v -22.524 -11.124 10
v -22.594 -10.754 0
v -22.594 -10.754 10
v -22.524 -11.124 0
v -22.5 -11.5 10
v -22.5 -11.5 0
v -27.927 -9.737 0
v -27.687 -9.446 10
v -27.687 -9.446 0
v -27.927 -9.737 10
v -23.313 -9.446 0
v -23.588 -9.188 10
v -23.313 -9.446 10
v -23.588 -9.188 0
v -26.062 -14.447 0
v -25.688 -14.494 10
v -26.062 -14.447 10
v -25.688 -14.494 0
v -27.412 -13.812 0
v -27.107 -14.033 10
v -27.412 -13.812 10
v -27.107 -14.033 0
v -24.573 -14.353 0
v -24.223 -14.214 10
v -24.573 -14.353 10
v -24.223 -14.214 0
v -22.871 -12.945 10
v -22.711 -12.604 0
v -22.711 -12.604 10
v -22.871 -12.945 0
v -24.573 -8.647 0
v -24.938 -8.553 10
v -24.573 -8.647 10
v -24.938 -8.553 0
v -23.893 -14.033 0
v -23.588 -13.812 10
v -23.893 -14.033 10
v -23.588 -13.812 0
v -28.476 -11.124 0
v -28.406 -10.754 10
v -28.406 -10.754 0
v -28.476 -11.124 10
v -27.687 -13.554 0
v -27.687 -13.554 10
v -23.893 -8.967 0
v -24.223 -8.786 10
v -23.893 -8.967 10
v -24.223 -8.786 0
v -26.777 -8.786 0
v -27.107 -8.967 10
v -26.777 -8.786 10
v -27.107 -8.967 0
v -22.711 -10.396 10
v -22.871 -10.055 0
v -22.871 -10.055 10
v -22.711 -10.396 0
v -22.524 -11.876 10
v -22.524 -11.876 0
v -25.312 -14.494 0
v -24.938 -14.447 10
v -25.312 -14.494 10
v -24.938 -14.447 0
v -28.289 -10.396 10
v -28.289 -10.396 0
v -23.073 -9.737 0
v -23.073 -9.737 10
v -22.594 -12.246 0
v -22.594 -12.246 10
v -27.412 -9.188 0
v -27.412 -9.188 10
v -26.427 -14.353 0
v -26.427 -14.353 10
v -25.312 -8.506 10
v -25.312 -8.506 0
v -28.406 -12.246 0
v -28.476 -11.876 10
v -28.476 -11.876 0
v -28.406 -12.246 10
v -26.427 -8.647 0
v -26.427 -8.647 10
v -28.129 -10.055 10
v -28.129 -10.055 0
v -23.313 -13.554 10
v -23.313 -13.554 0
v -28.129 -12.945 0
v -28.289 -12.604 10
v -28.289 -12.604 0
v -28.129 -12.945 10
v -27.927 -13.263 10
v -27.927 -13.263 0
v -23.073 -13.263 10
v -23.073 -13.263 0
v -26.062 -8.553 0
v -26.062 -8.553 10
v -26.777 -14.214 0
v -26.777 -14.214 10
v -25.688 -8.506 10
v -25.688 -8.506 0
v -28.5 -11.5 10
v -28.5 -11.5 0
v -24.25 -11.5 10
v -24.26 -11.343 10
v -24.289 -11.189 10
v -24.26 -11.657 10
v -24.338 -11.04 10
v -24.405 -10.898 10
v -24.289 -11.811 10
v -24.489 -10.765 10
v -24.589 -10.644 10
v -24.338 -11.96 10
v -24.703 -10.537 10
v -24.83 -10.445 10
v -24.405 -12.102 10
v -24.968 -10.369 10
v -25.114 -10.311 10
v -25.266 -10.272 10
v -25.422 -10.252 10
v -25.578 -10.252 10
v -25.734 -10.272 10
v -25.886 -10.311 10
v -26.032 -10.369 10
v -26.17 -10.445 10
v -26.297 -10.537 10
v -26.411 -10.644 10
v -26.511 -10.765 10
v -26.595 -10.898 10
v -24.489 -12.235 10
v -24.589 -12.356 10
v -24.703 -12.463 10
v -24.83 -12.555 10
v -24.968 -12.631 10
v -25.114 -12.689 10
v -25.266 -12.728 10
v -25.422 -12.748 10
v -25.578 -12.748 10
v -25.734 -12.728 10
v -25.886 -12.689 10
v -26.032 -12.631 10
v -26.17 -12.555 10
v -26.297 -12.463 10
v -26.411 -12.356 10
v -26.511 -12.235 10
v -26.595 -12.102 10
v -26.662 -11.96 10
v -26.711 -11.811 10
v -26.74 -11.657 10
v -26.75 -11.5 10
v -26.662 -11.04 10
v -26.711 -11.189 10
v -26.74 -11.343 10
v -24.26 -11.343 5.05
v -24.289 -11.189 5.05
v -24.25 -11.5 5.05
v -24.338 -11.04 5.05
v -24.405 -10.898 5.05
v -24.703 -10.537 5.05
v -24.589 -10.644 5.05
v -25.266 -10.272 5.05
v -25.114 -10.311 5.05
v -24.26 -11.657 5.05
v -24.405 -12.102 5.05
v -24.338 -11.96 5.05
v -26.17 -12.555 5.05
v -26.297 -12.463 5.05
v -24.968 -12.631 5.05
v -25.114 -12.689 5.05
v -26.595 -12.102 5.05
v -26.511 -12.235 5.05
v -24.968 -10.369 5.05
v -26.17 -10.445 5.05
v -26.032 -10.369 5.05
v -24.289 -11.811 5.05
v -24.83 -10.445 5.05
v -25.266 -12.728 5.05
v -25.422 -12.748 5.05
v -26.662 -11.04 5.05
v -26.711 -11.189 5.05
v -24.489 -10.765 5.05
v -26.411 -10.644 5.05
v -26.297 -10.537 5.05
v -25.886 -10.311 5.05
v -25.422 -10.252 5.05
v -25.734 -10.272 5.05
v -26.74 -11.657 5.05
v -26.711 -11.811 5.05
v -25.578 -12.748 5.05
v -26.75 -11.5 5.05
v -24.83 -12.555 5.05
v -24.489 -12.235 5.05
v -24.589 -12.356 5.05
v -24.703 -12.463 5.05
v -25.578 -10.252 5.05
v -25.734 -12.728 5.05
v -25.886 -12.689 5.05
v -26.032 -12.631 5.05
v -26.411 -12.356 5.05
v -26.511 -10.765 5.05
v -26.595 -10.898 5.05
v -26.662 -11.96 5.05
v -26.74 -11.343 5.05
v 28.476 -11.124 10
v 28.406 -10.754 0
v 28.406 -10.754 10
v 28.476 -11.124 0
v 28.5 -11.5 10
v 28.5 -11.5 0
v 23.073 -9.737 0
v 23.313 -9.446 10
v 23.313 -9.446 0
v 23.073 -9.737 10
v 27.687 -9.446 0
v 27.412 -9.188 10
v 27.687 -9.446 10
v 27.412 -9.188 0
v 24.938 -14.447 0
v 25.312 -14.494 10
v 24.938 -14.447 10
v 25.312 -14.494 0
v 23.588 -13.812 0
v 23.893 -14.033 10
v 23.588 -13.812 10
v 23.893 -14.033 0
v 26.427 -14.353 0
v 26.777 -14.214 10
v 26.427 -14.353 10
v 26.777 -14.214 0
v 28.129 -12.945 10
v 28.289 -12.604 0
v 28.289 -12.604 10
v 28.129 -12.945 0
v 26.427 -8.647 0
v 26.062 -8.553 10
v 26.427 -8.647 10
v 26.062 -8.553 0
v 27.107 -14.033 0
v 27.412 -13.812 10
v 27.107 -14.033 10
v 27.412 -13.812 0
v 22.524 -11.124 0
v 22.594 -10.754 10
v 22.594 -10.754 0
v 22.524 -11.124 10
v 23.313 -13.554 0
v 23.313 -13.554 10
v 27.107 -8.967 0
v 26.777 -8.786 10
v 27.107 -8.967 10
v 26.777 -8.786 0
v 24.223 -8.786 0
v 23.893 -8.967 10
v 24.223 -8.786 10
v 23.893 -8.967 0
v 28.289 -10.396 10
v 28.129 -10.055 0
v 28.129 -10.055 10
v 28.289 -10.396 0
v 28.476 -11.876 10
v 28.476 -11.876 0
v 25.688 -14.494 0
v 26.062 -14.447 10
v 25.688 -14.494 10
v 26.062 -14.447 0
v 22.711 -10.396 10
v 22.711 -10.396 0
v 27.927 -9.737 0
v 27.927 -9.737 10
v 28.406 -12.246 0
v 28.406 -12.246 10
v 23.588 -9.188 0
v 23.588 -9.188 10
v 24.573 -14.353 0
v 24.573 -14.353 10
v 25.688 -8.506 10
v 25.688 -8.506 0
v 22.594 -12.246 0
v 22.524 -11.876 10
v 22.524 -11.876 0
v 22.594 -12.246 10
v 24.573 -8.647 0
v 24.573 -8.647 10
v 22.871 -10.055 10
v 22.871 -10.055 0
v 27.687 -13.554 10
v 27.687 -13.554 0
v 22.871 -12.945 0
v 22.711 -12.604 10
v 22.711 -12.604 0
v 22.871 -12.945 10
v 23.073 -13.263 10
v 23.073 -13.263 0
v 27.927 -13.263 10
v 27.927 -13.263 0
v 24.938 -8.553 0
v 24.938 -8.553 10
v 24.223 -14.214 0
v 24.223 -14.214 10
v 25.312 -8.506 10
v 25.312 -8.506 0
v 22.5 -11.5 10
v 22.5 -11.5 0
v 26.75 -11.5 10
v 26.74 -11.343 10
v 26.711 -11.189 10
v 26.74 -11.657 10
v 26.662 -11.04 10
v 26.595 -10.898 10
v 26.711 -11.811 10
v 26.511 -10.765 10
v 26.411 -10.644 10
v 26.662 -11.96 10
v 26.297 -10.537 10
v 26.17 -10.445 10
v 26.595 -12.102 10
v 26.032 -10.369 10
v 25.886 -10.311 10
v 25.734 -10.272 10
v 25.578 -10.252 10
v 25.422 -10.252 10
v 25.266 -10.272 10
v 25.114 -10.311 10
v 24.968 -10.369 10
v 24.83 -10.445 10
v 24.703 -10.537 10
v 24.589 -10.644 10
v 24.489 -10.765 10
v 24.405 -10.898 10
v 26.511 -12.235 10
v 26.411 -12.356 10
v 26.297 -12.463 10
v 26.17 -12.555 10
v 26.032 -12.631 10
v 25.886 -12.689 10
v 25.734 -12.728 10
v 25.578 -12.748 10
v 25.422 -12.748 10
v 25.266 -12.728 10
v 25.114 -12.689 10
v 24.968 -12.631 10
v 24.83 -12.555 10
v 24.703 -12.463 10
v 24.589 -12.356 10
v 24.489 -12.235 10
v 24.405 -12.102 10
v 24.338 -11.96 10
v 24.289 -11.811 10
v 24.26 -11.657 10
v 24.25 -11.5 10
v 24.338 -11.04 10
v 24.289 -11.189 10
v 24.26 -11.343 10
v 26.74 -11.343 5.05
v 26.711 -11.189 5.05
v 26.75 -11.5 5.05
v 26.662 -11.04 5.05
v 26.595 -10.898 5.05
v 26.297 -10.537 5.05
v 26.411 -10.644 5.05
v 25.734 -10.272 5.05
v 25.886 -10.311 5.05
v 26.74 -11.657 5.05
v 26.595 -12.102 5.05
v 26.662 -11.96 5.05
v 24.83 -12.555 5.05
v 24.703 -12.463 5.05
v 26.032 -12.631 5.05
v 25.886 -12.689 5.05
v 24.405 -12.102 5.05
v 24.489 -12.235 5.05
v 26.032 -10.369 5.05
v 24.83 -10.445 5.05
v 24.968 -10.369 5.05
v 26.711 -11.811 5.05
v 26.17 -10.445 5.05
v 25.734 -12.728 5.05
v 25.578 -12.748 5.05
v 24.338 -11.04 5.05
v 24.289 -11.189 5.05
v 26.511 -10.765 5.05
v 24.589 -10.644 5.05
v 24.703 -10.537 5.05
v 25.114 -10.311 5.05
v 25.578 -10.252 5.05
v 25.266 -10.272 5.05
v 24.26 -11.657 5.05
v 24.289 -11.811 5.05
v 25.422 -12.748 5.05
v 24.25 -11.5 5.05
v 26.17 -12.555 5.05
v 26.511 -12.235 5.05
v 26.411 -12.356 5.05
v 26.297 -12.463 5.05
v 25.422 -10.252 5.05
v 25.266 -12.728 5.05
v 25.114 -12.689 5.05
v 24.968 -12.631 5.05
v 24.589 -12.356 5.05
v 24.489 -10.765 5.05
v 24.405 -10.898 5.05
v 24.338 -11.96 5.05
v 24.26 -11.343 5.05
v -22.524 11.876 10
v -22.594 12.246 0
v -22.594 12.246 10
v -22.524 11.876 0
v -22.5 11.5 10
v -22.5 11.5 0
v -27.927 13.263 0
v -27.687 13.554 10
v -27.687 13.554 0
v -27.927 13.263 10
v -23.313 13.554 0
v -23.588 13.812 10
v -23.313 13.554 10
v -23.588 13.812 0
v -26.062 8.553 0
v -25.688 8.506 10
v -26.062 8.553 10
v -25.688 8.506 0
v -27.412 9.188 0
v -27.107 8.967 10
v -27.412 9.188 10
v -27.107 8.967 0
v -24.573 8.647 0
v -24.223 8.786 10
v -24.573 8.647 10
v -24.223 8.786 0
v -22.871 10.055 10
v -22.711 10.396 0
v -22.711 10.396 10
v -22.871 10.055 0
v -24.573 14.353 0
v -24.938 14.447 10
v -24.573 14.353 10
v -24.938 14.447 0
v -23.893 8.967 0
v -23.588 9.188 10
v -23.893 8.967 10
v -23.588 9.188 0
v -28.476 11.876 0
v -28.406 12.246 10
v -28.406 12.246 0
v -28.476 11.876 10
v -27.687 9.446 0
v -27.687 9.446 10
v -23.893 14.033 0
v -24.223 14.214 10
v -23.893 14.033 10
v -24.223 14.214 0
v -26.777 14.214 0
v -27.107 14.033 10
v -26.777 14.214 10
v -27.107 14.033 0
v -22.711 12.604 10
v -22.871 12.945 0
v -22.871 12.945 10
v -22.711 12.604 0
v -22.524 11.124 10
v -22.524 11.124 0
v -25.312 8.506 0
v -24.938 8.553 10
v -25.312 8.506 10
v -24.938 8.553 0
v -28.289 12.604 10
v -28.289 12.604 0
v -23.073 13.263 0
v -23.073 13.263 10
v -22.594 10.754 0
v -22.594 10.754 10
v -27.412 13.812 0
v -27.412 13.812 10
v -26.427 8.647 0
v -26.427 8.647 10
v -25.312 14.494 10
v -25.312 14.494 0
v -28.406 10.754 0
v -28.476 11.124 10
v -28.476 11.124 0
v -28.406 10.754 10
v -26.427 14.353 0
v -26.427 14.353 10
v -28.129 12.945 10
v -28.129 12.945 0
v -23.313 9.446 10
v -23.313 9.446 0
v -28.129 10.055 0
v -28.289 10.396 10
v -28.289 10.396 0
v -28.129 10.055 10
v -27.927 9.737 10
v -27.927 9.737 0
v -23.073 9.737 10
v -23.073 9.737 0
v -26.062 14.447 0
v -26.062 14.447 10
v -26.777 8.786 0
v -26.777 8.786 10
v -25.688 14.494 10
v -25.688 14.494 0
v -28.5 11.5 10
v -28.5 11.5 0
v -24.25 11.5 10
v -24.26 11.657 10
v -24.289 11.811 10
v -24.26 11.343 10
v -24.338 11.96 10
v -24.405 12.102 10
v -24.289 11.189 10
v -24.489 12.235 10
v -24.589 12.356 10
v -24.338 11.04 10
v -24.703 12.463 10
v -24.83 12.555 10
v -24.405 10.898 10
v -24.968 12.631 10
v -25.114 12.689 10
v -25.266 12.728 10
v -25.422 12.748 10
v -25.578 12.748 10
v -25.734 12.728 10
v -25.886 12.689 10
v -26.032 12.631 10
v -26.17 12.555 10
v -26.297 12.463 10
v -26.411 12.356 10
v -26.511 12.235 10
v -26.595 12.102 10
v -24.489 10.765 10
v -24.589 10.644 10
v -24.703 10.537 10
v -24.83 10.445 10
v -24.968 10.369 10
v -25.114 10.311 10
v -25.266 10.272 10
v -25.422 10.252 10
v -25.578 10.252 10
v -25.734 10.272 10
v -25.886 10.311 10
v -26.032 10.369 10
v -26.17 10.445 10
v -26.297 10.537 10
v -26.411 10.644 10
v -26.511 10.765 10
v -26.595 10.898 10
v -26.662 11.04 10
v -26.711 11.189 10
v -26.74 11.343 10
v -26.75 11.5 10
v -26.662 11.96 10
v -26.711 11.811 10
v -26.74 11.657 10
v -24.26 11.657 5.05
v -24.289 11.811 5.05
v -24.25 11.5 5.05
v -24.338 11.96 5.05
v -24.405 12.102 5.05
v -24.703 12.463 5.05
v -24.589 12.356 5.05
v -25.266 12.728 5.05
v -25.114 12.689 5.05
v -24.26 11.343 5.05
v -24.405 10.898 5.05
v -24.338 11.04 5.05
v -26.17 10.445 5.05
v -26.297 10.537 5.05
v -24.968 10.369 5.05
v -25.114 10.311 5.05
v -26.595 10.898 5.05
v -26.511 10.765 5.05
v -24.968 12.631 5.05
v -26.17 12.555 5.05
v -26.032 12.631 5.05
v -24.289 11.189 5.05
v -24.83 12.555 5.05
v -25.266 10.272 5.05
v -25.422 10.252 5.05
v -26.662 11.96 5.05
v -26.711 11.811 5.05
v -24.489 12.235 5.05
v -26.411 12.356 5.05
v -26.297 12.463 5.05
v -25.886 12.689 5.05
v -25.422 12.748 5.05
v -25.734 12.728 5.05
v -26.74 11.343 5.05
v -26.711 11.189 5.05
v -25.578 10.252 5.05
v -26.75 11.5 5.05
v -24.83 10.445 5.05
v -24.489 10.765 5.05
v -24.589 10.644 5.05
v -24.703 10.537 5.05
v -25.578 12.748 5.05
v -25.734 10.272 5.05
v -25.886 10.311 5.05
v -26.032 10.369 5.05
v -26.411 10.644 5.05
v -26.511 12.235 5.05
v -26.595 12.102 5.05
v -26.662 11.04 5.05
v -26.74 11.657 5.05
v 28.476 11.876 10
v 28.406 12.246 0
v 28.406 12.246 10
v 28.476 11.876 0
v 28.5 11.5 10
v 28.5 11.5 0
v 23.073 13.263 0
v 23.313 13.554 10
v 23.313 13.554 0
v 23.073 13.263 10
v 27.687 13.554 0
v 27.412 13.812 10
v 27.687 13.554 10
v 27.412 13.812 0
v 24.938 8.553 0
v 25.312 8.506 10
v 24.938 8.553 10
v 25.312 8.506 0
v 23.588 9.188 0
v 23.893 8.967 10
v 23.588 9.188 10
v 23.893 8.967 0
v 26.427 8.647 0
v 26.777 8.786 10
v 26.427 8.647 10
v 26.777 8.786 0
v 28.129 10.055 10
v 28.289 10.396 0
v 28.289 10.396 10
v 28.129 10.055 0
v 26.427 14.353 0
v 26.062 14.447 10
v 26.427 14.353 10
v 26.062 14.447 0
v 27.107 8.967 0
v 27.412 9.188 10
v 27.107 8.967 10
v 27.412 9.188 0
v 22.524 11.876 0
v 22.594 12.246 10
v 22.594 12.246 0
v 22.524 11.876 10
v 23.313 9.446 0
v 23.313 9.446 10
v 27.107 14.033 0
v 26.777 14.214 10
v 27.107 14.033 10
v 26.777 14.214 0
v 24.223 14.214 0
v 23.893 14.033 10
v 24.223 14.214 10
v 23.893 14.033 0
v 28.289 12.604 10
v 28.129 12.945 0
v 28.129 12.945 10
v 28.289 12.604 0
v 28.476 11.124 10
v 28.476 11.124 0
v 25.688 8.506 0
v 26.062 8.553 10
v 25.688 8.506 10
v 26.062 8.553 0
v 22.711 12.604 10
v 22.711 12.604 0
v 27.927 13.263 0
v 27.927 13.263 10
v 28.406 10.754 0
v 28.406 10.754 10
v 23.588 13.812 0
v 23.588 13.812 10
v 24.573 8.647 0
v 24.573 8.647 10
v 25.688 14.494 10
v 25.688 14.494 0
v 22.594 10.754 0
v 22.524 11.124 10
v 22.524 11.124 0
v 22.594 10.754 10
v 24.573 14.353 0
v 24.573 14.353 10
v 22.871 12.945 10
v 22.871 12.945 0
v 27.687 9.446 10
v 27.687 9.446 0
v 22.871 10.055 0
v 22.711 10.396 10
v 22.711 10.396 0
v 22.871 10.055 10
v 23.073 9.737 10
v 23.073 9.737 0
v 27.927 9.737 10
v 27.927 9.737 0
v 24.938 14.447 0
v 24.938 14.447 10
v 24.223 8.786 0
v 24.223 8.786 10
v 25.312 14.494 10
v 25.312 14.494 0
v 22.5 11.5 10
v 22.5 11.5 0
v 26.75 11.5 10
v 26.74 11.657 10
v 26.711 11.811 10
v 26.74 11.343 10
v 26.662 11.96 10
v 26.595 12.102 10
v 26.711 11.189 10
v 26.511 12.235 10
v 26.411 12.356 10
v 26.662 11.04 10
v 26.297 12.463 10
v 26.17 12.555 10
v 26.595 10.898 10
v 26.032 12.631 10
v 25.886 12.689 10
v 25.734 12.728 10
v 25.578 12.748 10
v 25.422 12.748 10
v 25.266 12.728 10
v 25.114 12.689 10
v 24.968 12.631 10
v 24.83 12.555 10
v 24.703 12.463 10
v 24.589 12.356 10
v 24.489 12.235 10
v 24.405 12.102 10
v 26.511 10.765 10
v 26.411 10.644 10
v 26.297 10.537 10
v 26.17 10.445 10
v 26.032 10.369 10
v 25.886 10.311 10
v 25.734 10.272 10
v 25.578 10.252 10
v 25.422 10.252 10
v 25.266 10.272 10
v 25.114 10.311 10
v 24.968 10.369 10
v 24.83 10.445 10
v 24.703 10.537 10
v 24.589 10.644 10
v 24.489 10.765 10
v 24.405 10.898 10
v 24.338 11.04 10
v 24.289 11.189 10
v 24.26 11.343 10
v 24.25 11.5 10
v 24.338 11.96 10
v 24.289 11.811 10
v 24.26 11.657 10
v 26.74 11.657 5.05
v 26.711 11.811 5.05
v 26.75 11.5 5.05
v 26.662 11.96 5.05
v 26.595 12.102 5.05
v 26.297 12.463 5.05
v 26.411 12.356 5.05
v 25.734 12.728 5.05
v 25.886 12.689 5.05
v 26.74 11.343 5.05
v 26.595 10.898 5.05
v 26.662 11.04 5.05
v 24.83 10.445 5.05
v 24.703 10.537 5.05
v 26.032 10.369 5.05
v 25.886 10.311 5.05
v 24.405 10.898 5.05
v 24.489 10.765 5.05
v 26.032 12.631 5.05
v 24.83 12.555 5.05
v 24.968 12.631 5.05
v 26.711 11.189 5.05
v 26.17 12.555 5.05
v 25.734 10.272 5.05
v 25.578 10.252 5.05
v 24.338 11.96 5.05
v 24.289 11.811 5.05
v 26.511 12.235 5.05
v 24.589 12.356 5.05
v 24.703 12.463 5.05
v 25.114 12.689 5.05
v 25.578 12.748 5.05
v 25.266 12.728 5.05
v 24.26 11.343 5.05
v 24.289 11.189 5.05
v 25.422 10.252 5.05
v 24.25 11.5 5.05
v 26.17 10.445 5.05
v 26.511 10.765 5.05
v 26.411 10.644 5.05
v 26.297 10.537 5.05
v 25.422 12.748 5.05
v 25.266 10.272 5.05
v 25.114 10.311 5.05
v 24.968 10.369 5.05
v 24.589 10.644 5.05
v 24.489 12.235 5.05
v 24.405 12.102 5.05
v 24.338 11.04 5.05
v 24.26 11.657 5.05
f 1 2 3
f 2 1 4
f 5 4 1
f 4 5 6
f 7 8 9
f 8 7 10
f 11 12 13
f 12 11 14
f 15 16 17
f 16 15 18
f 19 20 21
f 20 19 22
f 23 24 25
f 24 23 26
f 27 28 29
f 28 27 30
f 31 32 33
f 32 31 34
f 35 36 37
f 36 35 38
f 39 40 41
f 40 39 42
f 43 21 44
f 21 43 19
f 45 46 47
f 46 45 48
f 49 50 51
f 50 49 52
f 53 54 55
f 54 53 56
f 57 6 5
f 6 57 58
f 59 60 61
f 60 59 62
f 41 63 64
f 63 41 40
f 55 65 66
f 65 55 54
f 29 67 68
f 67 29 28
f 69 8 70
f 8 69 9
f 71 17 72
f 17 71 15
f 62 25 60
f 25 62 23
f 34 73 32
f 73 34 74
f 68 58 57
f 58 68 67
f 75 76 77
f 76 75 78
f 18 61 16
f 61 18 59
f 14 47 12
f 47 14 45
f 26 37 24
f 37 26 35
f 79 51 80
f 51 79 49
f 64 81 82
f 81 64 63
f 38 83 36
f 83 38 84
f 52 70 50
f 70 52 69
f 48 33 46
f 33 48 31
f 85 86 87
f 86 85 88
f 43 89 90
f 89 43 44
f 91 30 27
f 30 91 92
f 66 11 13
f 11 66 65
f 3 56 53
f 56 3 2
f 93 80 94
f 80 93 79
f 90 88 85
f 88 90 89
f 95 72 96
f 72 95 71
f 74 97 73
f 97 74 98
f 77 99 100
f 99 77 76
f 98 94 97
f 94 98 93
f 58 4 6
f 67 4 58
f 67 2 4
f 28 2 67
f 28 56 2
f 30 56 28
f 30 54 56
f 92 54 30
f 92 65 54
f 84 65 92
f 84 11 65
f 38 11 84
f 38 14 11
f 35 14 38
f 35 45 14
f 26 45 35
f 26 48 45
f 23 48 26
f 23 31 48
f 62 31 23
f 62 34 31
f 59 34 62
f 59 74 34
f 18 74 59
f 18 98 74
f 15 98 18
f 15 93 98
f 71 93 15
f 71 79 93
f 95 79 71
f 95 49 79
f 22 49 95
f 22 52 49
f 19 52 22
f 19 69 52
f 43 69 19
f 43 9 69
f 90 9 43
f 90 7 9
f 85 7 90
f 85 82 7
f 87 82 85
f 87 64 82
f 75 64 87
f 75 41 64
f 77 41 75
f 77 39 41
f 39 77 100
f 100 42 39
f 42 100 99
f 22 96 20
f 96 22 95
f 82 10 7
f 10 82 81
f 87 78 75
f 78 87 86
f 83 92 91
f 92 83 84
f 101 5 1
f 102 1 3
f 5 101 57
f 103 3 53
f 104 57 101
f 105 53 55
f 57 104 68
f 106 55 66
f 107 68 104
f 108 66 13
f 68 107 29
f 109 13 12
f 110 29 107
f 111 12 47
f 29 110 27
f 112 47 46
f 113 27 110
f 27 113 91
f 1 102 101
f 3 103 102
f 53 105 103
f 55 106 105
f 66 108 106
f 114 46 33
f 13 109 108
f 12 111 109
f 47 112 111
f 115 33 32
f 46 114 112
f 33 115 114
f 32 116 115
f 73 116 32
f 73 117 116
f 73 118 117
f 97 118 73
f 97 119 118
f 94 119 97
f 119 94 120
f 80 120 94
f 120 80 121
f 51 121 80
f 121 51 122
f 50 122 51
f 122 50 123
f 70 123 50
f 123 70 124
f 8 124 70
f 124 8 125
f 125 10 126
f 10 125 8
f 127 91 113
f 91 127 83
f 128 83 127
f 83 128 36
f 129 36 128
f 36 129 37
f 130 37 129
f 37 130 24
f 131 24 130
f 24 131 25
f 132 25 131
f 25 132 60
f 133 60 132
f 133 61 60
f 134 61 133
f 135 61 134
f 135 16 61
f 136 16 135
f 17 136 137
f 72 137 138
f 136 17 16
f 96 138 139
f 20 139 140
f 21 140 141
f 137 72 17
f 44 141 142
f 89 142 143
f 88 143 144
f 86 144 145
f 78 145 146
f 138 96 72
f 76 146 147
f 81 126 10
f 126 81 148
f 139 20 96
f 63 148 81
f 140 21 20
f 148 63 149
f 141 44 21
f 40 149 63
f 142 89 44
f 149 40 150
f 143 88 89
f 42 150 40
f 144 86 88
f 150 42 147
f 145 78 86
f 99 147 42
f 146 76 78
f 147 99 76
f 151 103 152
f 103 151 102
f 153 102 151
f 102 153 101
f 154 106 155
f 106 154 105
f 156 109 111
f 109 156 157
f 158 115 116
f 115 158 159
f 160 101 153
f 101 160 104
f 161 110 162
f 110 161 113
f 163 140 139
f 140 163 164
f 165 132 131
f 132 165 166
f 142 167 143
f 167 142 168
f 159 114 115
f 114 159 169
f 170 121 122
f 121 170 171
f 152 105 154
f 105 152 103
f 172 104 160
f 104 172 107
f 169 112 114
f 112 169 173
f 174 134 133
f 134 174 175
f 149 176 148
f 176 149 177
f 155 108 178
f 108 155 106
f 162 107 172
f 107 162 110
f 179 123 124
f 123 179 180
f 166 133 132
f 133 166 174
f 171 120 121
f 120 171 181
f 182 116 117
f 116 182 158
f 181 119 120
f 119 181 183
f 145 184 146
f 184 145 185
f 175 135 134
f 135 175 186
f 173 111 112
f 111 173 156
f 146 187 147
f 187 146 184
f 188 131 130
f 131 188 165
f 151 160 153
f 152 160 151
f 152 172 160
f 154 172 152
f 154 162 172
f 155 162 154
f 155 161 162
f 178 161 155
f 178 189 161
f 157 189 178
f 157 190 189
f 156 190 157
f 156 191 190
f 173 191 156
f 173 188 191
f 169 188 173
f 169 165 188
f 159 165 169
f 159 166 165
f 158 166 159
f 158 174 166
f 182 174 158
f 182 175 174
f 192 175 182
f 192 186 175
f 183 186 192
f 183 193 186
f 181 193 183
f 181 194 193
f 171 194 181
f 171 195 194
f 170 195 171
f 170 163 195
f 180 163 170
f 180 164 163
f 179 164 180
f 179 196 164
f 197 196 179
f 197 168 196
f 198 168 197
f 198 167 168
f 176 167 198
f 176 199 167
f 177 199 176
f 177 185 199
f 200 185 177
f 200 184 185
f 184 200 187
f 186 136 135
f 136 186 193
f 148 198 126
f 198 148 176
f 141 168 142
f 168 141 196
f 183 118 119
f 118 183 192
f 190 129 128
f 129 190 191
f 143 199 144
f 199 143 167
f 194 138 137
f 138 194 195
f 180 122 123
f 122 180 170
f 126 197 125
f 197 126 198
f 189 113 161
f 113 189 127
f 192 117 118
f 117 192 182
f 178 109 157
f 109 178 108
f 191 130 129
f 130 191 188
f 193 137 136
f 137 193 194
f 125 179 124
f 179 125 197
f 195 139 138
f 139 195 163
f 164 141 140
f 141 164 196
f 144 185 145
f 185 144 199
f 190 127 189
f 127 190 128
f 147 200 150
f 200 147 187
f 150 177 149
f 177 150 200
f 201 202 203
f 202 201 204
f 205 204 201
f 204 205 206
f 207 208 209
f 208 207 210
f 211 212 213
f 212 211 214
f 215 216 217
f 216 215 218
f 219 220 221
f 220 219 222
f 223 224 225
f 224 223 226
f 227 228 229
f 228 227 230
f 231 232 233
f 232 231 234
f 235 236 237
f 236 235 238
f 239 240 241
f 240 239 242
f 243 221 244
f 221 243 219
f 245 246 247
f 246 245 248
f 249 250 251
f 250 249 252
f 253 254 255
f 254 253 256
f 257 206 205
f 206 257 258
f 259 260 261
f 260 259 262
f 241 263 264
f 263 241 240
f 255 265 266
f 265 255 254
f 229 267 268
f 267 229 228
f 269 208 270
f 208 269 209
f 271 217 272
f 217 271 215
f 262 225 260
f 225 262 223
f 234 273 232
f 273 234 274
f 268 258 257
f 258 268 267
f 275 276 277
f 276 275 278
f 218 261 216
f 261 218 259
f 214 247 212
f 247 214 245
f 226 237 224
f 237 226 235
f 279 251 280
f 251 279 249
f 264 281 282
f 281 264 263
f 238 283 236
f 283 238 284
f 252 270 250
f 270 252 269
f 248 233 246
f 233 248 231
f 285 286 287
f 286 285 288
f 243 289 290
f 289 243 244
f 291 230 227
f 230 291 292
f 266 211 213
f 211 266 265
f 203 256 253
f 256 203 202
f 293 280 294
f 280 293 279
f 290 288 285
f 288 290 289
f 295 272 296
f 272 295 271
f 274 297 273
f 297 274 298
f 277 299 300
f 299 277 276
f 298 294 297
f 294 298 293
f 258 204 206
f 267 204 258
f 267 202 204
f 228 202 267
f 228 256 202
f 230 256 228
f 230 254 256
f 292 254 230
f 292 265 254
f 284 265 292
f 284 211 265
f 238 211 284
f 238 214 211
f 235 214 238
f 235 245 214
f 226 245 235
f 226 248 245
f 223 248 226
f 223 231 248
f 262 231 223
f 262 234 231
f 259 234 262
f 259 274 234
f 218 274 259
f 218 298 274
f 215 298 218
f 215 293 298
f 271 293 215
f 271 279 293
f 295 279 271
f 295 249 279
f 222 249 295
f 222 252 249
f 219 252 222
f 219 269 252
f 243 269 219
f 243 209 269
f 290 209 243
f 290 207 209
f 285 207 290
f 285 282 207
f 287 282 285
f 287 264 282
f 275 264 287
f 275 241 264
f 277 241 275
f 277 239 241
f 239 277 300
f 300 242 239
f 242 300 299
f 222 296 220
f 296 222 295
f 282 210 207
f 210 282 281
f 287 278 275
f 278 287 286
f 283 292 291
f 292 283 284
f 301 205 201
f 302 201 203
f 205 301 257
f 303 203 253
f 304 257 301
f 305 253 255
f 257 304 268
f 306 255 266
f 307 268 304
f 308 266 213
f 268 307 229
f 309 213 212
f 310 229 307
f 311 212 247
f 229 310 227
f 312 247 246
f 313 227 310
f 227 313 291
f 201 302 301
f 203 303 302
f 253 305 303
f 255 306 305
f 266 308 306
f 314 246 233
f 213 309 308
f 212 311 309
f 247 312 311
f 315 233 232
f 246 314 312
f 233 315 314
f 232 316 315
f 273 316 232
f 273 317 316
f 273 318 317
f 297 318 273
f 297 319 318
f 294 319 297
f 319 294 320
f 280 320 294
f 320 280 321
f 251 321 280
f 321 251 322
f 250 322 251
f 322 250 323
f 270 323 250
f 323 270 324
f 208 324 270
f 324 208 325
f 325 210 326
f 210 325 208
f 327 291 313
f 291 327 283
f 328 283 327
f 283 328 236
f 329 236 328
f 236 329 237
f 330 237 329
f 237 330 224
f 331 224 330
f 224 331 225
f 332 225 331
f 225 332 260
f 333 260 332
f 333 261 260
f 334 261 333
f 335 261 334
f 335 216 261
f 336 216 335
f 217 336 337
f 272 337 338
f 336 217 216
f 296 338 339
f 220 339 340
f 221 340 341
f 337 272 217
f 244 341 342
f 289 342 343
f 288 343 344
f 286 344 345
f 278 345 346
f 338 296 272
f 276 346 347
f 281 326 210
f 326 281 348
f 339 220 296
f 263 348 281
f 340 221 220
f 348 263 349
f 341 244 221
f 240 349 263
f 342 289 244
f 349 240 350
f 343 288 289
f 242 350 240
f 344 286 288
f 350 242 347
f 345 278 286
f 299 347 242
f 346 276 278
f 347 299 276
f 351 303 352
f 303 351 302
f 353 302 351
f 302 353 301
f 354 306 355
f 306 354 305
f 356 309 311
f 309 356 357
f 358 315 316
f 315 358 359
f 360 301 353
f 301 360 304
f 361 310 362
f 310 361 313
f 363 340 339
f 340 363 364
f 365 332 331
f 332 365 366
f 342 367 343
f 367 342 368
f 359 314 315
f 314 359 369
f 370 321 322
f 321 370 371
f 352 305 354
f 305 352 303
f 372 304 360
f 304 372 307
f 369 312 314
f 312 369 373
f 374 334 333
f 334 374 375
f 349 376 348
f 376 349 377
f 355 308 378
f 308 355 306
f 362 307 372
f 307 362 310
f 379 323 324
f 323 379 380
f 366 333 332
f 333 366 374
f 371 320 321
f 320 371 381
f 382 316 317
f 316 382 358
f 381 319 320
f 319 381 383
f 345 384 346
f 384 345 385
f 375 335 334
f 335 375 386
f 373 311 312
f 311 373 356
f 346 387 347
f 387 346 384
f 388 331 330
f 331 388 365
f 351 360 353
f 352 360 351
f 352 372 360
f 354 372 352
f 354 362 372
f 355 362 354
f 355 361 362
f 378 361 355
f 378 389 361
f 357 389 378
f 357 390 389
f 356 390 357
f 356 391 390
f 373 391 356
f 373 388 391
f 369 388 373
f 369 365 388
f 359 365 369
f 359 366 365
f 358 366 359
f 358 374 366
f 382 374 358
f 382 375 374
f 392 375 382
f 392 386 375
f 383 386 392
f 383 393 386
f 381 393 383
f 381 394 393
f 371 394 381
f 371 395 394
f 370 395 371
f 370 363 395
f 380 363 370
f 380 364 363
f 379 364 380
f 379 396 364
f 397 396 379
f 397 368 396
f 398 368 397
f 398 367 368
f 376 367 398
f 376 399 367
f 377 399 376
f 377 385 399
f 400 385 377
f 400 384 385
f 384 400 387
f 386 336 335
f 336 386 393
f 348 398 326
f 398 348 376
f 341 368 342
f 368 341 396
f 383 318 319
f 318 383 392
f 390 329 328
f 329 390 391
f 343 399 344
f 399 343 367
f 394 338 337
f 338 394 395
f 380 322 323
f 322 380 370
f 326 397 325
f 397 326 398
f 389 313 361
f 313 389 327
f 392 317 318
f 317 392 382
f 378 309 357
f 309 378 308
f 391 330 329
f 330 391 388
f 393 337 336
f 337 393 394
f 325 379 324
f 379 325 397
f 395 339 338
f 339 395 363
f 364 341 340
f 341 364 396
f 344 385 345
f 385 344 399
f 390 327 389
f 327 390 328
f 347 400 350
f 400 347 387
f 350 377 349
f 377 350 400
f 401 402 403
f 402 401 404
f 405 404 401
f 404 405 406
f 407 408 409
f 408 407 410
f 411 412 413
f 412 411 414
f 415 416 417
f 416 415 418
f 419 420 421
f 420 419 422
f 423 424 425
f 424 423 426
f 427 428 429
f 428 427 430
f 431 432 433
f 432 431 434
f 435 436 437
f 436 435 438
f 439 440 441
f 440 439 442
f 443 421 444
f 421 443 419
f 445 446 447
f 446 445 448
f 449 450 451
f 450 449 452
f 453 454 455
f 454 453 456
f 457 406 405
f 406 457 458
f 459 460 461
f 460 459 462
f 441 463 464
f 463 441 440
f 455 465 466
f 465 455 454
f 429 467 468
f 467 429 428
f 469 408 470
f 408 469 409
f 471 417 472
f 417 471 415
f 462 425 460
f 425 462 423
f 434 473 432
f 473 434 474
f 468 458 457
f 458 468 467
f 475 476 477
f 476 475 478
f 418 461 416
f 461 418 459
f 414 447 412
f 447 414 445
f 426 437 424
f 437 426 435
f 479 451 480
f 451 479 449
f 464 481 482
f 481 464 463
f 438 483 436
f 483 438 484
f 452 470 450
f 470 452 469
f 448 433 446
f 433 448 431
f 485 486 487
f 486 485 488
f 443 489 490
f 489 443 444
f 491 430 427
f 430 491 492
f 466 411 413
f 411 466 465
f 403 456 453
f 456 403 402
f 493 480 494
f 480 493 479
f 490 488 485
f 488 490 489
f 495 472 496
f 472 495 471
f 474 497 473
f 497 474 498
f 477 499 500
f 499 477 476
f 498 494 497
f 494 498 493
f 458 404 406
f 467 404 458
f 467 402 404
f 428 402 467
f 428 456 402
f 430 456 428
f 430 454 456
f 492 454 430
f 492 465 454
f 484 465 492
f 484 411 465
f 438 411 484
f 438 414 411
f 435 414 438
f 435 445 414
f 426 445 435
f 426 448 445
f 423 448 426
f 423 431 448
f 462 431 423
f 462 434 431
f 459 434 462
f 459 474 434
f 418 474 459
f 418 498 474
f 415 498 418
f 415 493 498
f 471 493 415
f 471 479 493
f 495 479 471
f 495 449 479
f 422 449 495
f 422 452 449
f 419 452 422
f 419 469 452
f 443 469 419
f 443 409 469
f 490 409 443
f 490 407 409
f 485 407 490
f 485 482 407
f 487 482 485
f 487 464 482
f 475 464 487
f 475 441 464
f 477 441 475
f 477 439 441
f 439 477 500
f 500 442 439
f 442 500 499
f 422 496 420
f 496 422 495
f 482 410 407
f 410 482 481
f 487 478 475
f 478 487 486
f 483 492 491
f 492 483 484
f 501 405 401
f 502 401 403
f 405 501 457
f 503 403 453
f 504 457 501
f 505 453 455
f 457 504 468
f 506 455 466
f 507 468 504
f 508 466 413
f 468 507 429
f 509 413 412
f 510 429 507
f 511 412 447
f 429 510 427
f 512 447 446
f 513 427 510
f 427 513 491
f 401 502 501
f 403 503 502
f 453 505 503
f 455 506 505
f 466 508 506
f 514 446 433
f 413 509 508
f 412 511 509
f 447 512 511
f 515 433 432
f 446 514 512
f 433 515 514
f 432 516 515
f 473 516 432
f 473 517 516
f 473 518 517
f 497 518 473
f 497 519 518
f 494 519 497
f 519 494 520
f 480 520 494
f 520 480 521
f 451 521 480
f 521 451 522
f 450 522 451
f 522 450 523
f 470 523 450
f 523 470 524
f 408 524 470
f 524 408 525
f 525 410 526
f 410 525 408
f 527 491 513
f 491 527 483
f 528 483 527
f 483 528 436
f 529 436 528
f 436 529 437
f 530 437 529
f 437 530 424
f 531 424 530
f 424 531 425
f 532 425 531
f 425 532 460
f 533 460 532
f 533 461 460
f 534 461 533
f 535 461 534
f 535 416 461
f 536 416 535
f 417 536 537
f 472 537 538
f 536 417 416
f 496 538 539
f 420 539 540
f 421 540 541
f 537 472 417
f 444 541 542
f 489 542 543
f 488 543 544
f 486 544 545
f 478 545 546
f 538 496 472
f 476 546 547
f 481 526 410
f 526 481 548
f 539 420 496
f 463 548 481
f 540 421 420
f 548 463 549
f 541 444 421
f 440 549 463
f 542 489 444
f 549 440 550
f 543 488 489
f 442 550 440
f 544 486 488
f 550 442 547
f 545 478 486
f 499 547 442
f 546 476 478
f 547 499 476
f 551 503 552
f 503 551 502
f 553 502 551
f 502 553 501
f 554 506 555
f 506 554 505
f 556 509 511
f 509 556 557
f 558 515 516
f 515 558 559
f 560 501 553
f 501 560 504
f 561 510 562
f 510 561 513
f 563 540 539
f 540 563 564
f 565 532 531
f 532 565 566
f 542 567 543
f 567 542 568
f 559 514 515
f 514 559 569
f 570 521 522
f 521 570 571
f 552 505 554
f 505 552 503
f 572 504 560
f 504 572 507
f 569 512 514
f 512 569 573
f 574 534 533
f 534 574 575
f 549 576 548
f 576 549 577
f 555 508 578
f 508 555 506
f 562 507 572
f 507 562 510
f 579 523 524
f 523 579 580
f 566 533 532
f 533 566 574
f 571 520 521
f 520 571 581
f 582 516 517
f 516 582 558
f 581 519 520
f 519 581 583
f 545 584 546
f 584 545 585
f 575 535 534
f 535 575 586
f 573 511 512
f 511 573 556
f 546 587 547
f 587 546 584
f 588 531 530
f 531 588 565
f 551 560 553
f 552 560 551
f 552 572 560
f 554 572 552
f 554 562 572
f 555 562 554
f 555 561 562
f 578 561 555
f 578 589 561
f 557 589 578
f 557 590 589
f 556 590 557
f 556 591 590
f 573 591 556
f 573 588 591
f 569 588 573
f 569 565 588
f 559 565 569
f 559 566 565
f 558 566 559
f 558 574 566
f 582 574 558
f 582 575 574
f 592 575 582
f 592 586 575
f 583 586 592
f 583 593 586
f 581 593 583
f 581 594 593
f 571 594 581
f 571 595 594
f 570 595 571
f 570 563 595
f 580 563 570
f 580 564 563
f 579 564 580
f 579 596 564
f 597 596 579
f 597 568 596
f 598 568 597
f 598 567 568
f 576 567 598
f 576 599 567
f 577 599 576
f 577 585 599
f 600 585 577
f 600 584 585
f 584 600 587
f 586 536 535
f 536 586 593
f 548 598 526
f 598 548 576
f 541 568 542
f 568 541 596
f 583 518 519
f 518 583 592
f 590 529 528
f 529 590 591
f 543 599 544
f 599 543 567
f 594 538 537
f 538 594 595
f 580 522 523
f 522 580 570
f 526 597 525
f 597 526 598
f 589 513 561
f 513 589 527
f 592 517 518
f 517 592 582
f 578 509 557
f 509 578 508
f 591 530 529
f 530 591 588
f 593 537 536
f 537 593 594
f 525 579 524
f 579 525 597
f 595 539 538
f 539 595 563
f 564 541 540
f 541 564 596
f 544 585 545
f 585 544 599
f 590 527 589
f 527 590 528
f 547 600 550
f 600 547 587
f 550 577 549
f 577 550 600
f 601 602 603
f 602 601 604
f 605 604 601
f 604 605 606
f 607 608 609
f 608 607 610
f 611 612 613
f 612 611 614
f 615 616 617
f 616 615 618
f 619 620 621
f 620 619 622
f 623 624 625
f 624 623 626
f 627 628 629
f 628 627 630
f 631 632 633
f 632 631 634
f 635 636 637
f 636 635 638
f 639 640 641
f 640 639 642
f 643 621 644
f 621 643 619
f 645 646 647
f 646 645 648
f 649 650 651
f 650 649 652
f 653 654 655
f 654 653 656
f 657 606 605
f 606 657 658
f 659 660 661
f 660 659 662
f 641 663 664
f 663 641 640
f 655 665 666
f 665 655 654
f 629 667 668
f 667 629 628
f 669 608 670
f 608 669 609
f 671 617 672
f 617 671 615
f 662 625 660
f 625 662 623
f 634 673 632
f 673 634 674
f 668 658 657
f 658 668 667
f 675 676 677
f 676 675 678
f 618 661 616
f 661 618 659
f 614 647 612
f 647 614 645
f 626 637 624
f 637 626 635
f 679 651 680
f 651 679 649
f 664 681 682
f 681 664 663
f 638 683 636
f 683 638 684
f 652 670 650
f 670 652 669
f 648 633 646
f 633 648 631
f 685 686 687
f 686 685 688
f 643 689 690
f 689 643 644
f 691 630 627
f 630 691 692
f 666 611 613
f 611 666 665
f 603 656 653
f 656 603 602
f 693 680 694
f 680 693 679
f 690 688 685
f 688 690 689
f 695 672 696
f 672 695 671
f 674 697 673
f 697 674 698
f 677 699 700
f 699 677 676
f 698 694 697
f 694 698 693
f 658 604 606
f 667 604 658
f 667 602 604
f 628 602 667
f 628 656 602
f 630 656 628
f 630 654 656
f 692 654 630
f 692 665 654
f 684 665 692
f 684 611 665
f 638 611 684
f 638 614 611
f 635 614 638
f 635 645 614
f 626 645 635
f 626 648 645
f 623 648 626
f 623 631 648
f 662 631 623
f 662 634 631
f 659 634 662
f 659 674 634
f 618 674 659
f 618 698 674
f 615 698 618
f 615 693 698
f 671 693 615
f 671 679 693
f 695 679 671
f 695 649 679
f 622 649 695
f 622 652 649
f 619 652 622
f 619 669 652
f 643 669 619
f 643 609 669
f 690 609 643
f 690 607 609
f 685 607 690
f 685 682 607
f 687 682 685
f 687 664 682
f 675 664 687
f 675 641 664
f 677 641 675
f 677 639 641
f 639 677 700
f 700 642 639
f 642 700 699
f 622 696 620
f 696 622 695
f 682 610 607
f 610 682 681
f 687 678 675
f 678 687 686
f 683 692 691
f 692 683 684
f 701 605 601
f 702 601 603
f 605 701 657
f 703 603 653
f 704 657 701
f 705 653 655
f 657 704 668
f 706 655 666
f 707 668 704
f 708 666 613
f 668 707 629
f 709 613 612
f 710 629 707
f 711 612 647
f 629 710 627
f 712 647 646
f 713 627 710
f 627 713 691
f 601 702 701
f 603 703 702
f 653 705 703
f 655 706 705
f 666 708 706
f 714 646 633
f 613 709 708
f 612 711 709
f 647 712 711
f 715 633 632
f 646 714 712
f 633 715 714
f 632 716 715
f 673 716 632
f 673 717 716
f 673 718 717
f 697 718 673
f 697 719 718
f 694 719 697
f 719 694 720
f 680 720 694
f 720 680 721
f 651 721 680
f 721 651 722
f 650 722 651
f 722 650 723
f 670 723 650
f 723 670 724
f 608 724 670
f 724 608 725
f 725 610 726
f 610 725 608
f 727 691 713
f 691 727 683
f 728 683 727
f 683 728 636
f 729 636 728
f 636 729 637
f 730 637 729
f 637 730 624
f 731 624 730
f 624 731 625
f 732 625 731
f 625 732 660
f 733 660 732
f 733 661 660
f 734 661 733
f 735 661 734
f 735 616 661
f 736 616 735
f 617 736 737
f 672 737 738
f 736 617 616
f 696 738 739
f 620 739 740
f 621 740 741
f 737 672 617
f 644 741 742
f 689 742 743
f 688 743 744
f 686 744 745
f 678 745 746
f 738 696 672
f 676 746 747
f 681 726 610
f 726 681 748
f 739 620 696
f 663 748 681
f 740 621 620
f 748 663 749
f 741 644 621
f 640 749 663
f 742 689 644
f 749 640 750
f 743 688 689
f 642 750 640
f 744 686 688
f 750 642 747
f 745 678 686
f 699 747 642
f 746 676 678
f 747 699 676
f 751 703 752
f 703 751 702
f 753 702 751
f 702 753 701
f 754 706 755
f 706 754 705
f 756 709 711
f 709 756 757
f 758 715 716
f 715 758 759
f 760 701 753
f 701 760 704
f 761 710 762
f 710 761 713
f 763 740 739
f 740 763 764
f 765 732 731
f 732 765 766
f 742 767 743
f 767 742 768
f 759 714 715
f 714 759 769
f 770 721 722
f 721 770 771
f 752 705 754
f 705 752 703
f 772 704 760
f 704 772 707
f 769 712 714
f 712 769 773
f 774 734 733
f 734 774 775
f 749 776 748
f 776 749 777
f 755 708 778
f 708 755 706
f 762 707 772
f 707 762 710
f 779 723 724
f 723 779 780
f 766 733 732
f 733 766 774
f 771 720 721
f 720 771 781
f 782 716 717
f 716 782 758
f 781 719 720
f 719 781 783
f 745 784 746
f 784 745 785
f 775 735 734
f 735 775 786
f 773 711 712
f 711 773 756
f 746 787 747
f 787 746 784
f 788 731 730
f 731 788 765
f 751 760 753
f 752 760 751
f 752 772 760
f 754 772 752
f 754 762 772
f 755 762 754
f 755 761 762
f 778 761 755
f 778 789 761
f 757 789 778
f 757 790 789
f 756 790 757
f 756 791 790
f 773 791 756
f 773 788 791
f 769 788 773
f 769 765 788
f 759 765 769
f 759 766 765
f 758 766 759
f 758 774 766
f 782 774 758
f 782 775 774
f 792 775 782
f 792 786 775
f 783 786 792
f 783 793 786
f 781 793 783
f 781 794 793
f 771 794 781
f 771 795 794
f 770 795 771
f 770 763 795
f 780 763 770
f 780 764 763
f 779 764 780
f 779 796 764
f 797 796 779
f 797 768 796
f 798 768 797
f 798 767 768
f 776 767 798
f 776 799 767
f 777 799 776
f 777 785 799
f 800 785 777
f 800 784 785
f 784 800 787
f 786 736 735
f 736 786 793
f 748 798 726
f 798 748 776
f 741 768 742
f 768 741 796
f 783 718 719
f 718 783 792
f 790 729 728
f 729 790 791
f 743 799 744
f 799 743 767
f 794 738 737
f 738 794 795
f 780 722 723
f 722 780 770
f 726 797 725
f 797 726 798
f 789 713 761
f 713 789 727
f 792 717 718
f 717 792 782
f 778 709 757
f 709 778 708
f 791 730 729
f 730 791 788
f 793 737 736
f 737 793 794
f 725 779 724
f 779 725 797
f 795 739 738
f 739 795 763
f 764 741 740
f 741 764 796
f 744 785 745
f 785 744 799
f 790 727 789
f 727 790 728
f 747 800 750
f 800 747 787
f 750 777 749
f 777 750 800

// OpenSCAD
// Standoff Generator Module
//
// Author: Steven Nemetz
//
// Current version: https://github.com/snemetz/OpenSCAD-Modules/tree/master/standoffs
// Customizable: http://www.thingiverse.com/thing:1528494
/*
	REVISION HISTORY
	v0.2 Added Array-Same generation
	v0.1 Added hollow style
	Initial code refactored from :
		eriqjo's Standoff Customizer v1.0
			http://www.thingiverse.com/thing:351092
		and Kevin Osborn's Snap in PCB Standoff
*/
// TODO: Future Feature Ideas
//	flanges: top and/or bottom
//	flange styles:
//	bottom styles: support all top styles - rotate 180 and translate top
//	Look at adding features from http://www.thingiverse.com/thing:79944
//		or original http://www.thingiverse.com/thing:44894
//	threads for male & female

//CUSTOMIZER VARIABLES

//Type of standoff(s) to generate
Generate = 2; // [1:Single, 2:Array-Same, 3:Array-Samples]
/* [Body] */
//Choose shape of the main body
Shape = 1; // [1:Round, 2:Square, 3:Hex]
//Select height of the main body,  mm
BaseHeight = 10; // [0:50]
//Select diameter of the main body, mm
BaseDia = 6; // [0:30]
/* [Top] */
//Choose style of the top section
Style = 4; // [1:Male, 2:Snap-In, 3:Flat, 4:Female, 5:Hollow]
//Select height of the top, mm
TopHeight = 5; // [2:20]
//Select diameter of the top, mm
TopDia = 2.5; // [1:25]
/* [Array Settings] */
//For array: Space between standoffs, X mm
X_Offset = 51; // [2:30]
//For array: Space between standoffs, Y mm
Y_Offset = 23; // [2:30]
//For Array-Same
Columns = 2;
//For Array-Same
Rows = 2;

//CUSTOMIZER VARIABLES END

/* [Hidden] */
// For sample array
Shapes = [1:3]; // All valid shapes
Styles = [1:5]; // All valid styles

RndFrags = 50; // number of facet fragments for round shapes
// Parameters: style, height, diameter, Thread_Height
module standoffTop(style, baseHeight, topHeight, diameter) {
	radius = diameter/2;
	if (style == 1) { //male
		translate([0,0, baseHeight + topHeight/2 - 0.1])
			cylinder(topHeight + 0.1, r = radius, $fn = RndFrags, center = true);
	} else if (style == 2) { // snapin
		// FIX: large top height - this is above base
		notchW = radius/1.5;//width of the flexy notch in terms of peg radius
		translate([0,0, baseHeight - 0.1]) // -2 needs to be a calc
			difference() {
				union() {
					// top standoff
					cylinder(r= radius,h = topHeight+1, $fn = RndFrags); //master peg
					// underside slant - relief for overhang
					translate([0,0,topHeight])
						cylinder(r1=radius,r2= radius+.5, h =1, $fn = RndFrags);
					// top slant - insertion cone
					translate([0,0,topHeight+1])
						cylinder(r1=radius+.5,r2= radius-.25, h =1, $fn = RndFrags);
					} //union
				// Internal cylinder cutout
				cylinder(r= radius-.5, h = topHeight+3, $fn = RndFrags);
				//notch for insertion flex
				translate([-(diameter+2)/2,-notchW/2,-0.1])
					cube([diameter+2,notchW,topHeight+2.2]);
			} //difference
	} else if (style == 3) { // flat - No top
	} else if (style == 4) { // female
		translate([0,0, baseHeight - topHeight/2 + 0.1])
			cylinder(topHeight + 0.1, r = radius, $fn = RndFrags, center = true);
	} else if (style == 5) { // hollow
		translate([0,0, baseHeight/2])
			cylinder(baseHeight + 0.1, r = radius, $fn = RndFrags, center = true);
	}
};
// Parameters: shape, height, diameter
module standoffBase(shape, height, diameter) {
	radius = diameter/2;
	if (shape == 1) { // round
		translate([0, 0, height/2])
			cylinder(height, r = radius, center = true, $fn = RndFrags);
	} else if (shape == 2) { // square
		translate([0,0, height/2])
			cube([diameter, diameter, height], center = true);
	} else if (shape == 3) { // hex
		cylinder(h = height, r = radius, center = false, $fn = 6);
	}
};
// Parameters: shape, style, Body_Diameter, Body_Height, Thread_Height, Thread_Dia
module standoff(shape, baseHeight, baseDiameter, style, topHeight, topDiameter) {
	if (style == 1 || style == 2) { // male or snap-in
		union() {
			standoffBase(shape, baseHeight, baseDiameter);
			standoffTop(style, baseHeight, topHeight, topDiameter);
		}
	} else if (style == 4 || style == 5) { // female or hollow
		difference() {
			standoffBase(shape, baseHeight, baseDiameter);
			standoffTop(style, baseHeight, topHeight, topDiameter);
		}
	} else if (style==3) { // flat - no top
		standoffBase(shape, baseHeight, baseDiameter);
	}
};

function range2vector(r) = [ for (i=r) i];

//
ShapesV = range2vector(Shapes);
StylesV = range2vector(Styles);
if (Generate == 1) { // single
	standoff(Shape,BaseHeight,BaseDia,Style,TopHeight,TopDia);
} else if (Generate == 2) { // array all same
	translate([-(X_Offset * (Rows+1))/2, -(Y_Offset * (Columns+1))/2, 0])
		union(){
			for (j = [1 : Rows]){
				translate([0,j * Y_Offset,0])
					for( i = [1 : Columns]){
						translate([i * X_Offset,0,0])
							standoff(Shape,BaseHeight,BaseDia,Style,TopHeight,TopDia);
					} // for
			} // for
		}; // union
} else if (Generate == 3) { // array Samples
	translate([-(X_Offset * (len(StylesV)+1))/2, -(Y_Offset * (len(ShapesV)+1))/2, 0])
		union(){
			for (shape = Shapes) {     // Rows of styles = row of a shape
				translate([0,shape * Y_Offset,0])
					for( style = Styles) {   // Columns of shapes = column of a style
						translate([style * X_Offset,0,0])
							standoff(shape, BaseHeight, BaseDia, style, TopHeight, TopDia);
					} // for
			} // for
		}; // union
};

// END
